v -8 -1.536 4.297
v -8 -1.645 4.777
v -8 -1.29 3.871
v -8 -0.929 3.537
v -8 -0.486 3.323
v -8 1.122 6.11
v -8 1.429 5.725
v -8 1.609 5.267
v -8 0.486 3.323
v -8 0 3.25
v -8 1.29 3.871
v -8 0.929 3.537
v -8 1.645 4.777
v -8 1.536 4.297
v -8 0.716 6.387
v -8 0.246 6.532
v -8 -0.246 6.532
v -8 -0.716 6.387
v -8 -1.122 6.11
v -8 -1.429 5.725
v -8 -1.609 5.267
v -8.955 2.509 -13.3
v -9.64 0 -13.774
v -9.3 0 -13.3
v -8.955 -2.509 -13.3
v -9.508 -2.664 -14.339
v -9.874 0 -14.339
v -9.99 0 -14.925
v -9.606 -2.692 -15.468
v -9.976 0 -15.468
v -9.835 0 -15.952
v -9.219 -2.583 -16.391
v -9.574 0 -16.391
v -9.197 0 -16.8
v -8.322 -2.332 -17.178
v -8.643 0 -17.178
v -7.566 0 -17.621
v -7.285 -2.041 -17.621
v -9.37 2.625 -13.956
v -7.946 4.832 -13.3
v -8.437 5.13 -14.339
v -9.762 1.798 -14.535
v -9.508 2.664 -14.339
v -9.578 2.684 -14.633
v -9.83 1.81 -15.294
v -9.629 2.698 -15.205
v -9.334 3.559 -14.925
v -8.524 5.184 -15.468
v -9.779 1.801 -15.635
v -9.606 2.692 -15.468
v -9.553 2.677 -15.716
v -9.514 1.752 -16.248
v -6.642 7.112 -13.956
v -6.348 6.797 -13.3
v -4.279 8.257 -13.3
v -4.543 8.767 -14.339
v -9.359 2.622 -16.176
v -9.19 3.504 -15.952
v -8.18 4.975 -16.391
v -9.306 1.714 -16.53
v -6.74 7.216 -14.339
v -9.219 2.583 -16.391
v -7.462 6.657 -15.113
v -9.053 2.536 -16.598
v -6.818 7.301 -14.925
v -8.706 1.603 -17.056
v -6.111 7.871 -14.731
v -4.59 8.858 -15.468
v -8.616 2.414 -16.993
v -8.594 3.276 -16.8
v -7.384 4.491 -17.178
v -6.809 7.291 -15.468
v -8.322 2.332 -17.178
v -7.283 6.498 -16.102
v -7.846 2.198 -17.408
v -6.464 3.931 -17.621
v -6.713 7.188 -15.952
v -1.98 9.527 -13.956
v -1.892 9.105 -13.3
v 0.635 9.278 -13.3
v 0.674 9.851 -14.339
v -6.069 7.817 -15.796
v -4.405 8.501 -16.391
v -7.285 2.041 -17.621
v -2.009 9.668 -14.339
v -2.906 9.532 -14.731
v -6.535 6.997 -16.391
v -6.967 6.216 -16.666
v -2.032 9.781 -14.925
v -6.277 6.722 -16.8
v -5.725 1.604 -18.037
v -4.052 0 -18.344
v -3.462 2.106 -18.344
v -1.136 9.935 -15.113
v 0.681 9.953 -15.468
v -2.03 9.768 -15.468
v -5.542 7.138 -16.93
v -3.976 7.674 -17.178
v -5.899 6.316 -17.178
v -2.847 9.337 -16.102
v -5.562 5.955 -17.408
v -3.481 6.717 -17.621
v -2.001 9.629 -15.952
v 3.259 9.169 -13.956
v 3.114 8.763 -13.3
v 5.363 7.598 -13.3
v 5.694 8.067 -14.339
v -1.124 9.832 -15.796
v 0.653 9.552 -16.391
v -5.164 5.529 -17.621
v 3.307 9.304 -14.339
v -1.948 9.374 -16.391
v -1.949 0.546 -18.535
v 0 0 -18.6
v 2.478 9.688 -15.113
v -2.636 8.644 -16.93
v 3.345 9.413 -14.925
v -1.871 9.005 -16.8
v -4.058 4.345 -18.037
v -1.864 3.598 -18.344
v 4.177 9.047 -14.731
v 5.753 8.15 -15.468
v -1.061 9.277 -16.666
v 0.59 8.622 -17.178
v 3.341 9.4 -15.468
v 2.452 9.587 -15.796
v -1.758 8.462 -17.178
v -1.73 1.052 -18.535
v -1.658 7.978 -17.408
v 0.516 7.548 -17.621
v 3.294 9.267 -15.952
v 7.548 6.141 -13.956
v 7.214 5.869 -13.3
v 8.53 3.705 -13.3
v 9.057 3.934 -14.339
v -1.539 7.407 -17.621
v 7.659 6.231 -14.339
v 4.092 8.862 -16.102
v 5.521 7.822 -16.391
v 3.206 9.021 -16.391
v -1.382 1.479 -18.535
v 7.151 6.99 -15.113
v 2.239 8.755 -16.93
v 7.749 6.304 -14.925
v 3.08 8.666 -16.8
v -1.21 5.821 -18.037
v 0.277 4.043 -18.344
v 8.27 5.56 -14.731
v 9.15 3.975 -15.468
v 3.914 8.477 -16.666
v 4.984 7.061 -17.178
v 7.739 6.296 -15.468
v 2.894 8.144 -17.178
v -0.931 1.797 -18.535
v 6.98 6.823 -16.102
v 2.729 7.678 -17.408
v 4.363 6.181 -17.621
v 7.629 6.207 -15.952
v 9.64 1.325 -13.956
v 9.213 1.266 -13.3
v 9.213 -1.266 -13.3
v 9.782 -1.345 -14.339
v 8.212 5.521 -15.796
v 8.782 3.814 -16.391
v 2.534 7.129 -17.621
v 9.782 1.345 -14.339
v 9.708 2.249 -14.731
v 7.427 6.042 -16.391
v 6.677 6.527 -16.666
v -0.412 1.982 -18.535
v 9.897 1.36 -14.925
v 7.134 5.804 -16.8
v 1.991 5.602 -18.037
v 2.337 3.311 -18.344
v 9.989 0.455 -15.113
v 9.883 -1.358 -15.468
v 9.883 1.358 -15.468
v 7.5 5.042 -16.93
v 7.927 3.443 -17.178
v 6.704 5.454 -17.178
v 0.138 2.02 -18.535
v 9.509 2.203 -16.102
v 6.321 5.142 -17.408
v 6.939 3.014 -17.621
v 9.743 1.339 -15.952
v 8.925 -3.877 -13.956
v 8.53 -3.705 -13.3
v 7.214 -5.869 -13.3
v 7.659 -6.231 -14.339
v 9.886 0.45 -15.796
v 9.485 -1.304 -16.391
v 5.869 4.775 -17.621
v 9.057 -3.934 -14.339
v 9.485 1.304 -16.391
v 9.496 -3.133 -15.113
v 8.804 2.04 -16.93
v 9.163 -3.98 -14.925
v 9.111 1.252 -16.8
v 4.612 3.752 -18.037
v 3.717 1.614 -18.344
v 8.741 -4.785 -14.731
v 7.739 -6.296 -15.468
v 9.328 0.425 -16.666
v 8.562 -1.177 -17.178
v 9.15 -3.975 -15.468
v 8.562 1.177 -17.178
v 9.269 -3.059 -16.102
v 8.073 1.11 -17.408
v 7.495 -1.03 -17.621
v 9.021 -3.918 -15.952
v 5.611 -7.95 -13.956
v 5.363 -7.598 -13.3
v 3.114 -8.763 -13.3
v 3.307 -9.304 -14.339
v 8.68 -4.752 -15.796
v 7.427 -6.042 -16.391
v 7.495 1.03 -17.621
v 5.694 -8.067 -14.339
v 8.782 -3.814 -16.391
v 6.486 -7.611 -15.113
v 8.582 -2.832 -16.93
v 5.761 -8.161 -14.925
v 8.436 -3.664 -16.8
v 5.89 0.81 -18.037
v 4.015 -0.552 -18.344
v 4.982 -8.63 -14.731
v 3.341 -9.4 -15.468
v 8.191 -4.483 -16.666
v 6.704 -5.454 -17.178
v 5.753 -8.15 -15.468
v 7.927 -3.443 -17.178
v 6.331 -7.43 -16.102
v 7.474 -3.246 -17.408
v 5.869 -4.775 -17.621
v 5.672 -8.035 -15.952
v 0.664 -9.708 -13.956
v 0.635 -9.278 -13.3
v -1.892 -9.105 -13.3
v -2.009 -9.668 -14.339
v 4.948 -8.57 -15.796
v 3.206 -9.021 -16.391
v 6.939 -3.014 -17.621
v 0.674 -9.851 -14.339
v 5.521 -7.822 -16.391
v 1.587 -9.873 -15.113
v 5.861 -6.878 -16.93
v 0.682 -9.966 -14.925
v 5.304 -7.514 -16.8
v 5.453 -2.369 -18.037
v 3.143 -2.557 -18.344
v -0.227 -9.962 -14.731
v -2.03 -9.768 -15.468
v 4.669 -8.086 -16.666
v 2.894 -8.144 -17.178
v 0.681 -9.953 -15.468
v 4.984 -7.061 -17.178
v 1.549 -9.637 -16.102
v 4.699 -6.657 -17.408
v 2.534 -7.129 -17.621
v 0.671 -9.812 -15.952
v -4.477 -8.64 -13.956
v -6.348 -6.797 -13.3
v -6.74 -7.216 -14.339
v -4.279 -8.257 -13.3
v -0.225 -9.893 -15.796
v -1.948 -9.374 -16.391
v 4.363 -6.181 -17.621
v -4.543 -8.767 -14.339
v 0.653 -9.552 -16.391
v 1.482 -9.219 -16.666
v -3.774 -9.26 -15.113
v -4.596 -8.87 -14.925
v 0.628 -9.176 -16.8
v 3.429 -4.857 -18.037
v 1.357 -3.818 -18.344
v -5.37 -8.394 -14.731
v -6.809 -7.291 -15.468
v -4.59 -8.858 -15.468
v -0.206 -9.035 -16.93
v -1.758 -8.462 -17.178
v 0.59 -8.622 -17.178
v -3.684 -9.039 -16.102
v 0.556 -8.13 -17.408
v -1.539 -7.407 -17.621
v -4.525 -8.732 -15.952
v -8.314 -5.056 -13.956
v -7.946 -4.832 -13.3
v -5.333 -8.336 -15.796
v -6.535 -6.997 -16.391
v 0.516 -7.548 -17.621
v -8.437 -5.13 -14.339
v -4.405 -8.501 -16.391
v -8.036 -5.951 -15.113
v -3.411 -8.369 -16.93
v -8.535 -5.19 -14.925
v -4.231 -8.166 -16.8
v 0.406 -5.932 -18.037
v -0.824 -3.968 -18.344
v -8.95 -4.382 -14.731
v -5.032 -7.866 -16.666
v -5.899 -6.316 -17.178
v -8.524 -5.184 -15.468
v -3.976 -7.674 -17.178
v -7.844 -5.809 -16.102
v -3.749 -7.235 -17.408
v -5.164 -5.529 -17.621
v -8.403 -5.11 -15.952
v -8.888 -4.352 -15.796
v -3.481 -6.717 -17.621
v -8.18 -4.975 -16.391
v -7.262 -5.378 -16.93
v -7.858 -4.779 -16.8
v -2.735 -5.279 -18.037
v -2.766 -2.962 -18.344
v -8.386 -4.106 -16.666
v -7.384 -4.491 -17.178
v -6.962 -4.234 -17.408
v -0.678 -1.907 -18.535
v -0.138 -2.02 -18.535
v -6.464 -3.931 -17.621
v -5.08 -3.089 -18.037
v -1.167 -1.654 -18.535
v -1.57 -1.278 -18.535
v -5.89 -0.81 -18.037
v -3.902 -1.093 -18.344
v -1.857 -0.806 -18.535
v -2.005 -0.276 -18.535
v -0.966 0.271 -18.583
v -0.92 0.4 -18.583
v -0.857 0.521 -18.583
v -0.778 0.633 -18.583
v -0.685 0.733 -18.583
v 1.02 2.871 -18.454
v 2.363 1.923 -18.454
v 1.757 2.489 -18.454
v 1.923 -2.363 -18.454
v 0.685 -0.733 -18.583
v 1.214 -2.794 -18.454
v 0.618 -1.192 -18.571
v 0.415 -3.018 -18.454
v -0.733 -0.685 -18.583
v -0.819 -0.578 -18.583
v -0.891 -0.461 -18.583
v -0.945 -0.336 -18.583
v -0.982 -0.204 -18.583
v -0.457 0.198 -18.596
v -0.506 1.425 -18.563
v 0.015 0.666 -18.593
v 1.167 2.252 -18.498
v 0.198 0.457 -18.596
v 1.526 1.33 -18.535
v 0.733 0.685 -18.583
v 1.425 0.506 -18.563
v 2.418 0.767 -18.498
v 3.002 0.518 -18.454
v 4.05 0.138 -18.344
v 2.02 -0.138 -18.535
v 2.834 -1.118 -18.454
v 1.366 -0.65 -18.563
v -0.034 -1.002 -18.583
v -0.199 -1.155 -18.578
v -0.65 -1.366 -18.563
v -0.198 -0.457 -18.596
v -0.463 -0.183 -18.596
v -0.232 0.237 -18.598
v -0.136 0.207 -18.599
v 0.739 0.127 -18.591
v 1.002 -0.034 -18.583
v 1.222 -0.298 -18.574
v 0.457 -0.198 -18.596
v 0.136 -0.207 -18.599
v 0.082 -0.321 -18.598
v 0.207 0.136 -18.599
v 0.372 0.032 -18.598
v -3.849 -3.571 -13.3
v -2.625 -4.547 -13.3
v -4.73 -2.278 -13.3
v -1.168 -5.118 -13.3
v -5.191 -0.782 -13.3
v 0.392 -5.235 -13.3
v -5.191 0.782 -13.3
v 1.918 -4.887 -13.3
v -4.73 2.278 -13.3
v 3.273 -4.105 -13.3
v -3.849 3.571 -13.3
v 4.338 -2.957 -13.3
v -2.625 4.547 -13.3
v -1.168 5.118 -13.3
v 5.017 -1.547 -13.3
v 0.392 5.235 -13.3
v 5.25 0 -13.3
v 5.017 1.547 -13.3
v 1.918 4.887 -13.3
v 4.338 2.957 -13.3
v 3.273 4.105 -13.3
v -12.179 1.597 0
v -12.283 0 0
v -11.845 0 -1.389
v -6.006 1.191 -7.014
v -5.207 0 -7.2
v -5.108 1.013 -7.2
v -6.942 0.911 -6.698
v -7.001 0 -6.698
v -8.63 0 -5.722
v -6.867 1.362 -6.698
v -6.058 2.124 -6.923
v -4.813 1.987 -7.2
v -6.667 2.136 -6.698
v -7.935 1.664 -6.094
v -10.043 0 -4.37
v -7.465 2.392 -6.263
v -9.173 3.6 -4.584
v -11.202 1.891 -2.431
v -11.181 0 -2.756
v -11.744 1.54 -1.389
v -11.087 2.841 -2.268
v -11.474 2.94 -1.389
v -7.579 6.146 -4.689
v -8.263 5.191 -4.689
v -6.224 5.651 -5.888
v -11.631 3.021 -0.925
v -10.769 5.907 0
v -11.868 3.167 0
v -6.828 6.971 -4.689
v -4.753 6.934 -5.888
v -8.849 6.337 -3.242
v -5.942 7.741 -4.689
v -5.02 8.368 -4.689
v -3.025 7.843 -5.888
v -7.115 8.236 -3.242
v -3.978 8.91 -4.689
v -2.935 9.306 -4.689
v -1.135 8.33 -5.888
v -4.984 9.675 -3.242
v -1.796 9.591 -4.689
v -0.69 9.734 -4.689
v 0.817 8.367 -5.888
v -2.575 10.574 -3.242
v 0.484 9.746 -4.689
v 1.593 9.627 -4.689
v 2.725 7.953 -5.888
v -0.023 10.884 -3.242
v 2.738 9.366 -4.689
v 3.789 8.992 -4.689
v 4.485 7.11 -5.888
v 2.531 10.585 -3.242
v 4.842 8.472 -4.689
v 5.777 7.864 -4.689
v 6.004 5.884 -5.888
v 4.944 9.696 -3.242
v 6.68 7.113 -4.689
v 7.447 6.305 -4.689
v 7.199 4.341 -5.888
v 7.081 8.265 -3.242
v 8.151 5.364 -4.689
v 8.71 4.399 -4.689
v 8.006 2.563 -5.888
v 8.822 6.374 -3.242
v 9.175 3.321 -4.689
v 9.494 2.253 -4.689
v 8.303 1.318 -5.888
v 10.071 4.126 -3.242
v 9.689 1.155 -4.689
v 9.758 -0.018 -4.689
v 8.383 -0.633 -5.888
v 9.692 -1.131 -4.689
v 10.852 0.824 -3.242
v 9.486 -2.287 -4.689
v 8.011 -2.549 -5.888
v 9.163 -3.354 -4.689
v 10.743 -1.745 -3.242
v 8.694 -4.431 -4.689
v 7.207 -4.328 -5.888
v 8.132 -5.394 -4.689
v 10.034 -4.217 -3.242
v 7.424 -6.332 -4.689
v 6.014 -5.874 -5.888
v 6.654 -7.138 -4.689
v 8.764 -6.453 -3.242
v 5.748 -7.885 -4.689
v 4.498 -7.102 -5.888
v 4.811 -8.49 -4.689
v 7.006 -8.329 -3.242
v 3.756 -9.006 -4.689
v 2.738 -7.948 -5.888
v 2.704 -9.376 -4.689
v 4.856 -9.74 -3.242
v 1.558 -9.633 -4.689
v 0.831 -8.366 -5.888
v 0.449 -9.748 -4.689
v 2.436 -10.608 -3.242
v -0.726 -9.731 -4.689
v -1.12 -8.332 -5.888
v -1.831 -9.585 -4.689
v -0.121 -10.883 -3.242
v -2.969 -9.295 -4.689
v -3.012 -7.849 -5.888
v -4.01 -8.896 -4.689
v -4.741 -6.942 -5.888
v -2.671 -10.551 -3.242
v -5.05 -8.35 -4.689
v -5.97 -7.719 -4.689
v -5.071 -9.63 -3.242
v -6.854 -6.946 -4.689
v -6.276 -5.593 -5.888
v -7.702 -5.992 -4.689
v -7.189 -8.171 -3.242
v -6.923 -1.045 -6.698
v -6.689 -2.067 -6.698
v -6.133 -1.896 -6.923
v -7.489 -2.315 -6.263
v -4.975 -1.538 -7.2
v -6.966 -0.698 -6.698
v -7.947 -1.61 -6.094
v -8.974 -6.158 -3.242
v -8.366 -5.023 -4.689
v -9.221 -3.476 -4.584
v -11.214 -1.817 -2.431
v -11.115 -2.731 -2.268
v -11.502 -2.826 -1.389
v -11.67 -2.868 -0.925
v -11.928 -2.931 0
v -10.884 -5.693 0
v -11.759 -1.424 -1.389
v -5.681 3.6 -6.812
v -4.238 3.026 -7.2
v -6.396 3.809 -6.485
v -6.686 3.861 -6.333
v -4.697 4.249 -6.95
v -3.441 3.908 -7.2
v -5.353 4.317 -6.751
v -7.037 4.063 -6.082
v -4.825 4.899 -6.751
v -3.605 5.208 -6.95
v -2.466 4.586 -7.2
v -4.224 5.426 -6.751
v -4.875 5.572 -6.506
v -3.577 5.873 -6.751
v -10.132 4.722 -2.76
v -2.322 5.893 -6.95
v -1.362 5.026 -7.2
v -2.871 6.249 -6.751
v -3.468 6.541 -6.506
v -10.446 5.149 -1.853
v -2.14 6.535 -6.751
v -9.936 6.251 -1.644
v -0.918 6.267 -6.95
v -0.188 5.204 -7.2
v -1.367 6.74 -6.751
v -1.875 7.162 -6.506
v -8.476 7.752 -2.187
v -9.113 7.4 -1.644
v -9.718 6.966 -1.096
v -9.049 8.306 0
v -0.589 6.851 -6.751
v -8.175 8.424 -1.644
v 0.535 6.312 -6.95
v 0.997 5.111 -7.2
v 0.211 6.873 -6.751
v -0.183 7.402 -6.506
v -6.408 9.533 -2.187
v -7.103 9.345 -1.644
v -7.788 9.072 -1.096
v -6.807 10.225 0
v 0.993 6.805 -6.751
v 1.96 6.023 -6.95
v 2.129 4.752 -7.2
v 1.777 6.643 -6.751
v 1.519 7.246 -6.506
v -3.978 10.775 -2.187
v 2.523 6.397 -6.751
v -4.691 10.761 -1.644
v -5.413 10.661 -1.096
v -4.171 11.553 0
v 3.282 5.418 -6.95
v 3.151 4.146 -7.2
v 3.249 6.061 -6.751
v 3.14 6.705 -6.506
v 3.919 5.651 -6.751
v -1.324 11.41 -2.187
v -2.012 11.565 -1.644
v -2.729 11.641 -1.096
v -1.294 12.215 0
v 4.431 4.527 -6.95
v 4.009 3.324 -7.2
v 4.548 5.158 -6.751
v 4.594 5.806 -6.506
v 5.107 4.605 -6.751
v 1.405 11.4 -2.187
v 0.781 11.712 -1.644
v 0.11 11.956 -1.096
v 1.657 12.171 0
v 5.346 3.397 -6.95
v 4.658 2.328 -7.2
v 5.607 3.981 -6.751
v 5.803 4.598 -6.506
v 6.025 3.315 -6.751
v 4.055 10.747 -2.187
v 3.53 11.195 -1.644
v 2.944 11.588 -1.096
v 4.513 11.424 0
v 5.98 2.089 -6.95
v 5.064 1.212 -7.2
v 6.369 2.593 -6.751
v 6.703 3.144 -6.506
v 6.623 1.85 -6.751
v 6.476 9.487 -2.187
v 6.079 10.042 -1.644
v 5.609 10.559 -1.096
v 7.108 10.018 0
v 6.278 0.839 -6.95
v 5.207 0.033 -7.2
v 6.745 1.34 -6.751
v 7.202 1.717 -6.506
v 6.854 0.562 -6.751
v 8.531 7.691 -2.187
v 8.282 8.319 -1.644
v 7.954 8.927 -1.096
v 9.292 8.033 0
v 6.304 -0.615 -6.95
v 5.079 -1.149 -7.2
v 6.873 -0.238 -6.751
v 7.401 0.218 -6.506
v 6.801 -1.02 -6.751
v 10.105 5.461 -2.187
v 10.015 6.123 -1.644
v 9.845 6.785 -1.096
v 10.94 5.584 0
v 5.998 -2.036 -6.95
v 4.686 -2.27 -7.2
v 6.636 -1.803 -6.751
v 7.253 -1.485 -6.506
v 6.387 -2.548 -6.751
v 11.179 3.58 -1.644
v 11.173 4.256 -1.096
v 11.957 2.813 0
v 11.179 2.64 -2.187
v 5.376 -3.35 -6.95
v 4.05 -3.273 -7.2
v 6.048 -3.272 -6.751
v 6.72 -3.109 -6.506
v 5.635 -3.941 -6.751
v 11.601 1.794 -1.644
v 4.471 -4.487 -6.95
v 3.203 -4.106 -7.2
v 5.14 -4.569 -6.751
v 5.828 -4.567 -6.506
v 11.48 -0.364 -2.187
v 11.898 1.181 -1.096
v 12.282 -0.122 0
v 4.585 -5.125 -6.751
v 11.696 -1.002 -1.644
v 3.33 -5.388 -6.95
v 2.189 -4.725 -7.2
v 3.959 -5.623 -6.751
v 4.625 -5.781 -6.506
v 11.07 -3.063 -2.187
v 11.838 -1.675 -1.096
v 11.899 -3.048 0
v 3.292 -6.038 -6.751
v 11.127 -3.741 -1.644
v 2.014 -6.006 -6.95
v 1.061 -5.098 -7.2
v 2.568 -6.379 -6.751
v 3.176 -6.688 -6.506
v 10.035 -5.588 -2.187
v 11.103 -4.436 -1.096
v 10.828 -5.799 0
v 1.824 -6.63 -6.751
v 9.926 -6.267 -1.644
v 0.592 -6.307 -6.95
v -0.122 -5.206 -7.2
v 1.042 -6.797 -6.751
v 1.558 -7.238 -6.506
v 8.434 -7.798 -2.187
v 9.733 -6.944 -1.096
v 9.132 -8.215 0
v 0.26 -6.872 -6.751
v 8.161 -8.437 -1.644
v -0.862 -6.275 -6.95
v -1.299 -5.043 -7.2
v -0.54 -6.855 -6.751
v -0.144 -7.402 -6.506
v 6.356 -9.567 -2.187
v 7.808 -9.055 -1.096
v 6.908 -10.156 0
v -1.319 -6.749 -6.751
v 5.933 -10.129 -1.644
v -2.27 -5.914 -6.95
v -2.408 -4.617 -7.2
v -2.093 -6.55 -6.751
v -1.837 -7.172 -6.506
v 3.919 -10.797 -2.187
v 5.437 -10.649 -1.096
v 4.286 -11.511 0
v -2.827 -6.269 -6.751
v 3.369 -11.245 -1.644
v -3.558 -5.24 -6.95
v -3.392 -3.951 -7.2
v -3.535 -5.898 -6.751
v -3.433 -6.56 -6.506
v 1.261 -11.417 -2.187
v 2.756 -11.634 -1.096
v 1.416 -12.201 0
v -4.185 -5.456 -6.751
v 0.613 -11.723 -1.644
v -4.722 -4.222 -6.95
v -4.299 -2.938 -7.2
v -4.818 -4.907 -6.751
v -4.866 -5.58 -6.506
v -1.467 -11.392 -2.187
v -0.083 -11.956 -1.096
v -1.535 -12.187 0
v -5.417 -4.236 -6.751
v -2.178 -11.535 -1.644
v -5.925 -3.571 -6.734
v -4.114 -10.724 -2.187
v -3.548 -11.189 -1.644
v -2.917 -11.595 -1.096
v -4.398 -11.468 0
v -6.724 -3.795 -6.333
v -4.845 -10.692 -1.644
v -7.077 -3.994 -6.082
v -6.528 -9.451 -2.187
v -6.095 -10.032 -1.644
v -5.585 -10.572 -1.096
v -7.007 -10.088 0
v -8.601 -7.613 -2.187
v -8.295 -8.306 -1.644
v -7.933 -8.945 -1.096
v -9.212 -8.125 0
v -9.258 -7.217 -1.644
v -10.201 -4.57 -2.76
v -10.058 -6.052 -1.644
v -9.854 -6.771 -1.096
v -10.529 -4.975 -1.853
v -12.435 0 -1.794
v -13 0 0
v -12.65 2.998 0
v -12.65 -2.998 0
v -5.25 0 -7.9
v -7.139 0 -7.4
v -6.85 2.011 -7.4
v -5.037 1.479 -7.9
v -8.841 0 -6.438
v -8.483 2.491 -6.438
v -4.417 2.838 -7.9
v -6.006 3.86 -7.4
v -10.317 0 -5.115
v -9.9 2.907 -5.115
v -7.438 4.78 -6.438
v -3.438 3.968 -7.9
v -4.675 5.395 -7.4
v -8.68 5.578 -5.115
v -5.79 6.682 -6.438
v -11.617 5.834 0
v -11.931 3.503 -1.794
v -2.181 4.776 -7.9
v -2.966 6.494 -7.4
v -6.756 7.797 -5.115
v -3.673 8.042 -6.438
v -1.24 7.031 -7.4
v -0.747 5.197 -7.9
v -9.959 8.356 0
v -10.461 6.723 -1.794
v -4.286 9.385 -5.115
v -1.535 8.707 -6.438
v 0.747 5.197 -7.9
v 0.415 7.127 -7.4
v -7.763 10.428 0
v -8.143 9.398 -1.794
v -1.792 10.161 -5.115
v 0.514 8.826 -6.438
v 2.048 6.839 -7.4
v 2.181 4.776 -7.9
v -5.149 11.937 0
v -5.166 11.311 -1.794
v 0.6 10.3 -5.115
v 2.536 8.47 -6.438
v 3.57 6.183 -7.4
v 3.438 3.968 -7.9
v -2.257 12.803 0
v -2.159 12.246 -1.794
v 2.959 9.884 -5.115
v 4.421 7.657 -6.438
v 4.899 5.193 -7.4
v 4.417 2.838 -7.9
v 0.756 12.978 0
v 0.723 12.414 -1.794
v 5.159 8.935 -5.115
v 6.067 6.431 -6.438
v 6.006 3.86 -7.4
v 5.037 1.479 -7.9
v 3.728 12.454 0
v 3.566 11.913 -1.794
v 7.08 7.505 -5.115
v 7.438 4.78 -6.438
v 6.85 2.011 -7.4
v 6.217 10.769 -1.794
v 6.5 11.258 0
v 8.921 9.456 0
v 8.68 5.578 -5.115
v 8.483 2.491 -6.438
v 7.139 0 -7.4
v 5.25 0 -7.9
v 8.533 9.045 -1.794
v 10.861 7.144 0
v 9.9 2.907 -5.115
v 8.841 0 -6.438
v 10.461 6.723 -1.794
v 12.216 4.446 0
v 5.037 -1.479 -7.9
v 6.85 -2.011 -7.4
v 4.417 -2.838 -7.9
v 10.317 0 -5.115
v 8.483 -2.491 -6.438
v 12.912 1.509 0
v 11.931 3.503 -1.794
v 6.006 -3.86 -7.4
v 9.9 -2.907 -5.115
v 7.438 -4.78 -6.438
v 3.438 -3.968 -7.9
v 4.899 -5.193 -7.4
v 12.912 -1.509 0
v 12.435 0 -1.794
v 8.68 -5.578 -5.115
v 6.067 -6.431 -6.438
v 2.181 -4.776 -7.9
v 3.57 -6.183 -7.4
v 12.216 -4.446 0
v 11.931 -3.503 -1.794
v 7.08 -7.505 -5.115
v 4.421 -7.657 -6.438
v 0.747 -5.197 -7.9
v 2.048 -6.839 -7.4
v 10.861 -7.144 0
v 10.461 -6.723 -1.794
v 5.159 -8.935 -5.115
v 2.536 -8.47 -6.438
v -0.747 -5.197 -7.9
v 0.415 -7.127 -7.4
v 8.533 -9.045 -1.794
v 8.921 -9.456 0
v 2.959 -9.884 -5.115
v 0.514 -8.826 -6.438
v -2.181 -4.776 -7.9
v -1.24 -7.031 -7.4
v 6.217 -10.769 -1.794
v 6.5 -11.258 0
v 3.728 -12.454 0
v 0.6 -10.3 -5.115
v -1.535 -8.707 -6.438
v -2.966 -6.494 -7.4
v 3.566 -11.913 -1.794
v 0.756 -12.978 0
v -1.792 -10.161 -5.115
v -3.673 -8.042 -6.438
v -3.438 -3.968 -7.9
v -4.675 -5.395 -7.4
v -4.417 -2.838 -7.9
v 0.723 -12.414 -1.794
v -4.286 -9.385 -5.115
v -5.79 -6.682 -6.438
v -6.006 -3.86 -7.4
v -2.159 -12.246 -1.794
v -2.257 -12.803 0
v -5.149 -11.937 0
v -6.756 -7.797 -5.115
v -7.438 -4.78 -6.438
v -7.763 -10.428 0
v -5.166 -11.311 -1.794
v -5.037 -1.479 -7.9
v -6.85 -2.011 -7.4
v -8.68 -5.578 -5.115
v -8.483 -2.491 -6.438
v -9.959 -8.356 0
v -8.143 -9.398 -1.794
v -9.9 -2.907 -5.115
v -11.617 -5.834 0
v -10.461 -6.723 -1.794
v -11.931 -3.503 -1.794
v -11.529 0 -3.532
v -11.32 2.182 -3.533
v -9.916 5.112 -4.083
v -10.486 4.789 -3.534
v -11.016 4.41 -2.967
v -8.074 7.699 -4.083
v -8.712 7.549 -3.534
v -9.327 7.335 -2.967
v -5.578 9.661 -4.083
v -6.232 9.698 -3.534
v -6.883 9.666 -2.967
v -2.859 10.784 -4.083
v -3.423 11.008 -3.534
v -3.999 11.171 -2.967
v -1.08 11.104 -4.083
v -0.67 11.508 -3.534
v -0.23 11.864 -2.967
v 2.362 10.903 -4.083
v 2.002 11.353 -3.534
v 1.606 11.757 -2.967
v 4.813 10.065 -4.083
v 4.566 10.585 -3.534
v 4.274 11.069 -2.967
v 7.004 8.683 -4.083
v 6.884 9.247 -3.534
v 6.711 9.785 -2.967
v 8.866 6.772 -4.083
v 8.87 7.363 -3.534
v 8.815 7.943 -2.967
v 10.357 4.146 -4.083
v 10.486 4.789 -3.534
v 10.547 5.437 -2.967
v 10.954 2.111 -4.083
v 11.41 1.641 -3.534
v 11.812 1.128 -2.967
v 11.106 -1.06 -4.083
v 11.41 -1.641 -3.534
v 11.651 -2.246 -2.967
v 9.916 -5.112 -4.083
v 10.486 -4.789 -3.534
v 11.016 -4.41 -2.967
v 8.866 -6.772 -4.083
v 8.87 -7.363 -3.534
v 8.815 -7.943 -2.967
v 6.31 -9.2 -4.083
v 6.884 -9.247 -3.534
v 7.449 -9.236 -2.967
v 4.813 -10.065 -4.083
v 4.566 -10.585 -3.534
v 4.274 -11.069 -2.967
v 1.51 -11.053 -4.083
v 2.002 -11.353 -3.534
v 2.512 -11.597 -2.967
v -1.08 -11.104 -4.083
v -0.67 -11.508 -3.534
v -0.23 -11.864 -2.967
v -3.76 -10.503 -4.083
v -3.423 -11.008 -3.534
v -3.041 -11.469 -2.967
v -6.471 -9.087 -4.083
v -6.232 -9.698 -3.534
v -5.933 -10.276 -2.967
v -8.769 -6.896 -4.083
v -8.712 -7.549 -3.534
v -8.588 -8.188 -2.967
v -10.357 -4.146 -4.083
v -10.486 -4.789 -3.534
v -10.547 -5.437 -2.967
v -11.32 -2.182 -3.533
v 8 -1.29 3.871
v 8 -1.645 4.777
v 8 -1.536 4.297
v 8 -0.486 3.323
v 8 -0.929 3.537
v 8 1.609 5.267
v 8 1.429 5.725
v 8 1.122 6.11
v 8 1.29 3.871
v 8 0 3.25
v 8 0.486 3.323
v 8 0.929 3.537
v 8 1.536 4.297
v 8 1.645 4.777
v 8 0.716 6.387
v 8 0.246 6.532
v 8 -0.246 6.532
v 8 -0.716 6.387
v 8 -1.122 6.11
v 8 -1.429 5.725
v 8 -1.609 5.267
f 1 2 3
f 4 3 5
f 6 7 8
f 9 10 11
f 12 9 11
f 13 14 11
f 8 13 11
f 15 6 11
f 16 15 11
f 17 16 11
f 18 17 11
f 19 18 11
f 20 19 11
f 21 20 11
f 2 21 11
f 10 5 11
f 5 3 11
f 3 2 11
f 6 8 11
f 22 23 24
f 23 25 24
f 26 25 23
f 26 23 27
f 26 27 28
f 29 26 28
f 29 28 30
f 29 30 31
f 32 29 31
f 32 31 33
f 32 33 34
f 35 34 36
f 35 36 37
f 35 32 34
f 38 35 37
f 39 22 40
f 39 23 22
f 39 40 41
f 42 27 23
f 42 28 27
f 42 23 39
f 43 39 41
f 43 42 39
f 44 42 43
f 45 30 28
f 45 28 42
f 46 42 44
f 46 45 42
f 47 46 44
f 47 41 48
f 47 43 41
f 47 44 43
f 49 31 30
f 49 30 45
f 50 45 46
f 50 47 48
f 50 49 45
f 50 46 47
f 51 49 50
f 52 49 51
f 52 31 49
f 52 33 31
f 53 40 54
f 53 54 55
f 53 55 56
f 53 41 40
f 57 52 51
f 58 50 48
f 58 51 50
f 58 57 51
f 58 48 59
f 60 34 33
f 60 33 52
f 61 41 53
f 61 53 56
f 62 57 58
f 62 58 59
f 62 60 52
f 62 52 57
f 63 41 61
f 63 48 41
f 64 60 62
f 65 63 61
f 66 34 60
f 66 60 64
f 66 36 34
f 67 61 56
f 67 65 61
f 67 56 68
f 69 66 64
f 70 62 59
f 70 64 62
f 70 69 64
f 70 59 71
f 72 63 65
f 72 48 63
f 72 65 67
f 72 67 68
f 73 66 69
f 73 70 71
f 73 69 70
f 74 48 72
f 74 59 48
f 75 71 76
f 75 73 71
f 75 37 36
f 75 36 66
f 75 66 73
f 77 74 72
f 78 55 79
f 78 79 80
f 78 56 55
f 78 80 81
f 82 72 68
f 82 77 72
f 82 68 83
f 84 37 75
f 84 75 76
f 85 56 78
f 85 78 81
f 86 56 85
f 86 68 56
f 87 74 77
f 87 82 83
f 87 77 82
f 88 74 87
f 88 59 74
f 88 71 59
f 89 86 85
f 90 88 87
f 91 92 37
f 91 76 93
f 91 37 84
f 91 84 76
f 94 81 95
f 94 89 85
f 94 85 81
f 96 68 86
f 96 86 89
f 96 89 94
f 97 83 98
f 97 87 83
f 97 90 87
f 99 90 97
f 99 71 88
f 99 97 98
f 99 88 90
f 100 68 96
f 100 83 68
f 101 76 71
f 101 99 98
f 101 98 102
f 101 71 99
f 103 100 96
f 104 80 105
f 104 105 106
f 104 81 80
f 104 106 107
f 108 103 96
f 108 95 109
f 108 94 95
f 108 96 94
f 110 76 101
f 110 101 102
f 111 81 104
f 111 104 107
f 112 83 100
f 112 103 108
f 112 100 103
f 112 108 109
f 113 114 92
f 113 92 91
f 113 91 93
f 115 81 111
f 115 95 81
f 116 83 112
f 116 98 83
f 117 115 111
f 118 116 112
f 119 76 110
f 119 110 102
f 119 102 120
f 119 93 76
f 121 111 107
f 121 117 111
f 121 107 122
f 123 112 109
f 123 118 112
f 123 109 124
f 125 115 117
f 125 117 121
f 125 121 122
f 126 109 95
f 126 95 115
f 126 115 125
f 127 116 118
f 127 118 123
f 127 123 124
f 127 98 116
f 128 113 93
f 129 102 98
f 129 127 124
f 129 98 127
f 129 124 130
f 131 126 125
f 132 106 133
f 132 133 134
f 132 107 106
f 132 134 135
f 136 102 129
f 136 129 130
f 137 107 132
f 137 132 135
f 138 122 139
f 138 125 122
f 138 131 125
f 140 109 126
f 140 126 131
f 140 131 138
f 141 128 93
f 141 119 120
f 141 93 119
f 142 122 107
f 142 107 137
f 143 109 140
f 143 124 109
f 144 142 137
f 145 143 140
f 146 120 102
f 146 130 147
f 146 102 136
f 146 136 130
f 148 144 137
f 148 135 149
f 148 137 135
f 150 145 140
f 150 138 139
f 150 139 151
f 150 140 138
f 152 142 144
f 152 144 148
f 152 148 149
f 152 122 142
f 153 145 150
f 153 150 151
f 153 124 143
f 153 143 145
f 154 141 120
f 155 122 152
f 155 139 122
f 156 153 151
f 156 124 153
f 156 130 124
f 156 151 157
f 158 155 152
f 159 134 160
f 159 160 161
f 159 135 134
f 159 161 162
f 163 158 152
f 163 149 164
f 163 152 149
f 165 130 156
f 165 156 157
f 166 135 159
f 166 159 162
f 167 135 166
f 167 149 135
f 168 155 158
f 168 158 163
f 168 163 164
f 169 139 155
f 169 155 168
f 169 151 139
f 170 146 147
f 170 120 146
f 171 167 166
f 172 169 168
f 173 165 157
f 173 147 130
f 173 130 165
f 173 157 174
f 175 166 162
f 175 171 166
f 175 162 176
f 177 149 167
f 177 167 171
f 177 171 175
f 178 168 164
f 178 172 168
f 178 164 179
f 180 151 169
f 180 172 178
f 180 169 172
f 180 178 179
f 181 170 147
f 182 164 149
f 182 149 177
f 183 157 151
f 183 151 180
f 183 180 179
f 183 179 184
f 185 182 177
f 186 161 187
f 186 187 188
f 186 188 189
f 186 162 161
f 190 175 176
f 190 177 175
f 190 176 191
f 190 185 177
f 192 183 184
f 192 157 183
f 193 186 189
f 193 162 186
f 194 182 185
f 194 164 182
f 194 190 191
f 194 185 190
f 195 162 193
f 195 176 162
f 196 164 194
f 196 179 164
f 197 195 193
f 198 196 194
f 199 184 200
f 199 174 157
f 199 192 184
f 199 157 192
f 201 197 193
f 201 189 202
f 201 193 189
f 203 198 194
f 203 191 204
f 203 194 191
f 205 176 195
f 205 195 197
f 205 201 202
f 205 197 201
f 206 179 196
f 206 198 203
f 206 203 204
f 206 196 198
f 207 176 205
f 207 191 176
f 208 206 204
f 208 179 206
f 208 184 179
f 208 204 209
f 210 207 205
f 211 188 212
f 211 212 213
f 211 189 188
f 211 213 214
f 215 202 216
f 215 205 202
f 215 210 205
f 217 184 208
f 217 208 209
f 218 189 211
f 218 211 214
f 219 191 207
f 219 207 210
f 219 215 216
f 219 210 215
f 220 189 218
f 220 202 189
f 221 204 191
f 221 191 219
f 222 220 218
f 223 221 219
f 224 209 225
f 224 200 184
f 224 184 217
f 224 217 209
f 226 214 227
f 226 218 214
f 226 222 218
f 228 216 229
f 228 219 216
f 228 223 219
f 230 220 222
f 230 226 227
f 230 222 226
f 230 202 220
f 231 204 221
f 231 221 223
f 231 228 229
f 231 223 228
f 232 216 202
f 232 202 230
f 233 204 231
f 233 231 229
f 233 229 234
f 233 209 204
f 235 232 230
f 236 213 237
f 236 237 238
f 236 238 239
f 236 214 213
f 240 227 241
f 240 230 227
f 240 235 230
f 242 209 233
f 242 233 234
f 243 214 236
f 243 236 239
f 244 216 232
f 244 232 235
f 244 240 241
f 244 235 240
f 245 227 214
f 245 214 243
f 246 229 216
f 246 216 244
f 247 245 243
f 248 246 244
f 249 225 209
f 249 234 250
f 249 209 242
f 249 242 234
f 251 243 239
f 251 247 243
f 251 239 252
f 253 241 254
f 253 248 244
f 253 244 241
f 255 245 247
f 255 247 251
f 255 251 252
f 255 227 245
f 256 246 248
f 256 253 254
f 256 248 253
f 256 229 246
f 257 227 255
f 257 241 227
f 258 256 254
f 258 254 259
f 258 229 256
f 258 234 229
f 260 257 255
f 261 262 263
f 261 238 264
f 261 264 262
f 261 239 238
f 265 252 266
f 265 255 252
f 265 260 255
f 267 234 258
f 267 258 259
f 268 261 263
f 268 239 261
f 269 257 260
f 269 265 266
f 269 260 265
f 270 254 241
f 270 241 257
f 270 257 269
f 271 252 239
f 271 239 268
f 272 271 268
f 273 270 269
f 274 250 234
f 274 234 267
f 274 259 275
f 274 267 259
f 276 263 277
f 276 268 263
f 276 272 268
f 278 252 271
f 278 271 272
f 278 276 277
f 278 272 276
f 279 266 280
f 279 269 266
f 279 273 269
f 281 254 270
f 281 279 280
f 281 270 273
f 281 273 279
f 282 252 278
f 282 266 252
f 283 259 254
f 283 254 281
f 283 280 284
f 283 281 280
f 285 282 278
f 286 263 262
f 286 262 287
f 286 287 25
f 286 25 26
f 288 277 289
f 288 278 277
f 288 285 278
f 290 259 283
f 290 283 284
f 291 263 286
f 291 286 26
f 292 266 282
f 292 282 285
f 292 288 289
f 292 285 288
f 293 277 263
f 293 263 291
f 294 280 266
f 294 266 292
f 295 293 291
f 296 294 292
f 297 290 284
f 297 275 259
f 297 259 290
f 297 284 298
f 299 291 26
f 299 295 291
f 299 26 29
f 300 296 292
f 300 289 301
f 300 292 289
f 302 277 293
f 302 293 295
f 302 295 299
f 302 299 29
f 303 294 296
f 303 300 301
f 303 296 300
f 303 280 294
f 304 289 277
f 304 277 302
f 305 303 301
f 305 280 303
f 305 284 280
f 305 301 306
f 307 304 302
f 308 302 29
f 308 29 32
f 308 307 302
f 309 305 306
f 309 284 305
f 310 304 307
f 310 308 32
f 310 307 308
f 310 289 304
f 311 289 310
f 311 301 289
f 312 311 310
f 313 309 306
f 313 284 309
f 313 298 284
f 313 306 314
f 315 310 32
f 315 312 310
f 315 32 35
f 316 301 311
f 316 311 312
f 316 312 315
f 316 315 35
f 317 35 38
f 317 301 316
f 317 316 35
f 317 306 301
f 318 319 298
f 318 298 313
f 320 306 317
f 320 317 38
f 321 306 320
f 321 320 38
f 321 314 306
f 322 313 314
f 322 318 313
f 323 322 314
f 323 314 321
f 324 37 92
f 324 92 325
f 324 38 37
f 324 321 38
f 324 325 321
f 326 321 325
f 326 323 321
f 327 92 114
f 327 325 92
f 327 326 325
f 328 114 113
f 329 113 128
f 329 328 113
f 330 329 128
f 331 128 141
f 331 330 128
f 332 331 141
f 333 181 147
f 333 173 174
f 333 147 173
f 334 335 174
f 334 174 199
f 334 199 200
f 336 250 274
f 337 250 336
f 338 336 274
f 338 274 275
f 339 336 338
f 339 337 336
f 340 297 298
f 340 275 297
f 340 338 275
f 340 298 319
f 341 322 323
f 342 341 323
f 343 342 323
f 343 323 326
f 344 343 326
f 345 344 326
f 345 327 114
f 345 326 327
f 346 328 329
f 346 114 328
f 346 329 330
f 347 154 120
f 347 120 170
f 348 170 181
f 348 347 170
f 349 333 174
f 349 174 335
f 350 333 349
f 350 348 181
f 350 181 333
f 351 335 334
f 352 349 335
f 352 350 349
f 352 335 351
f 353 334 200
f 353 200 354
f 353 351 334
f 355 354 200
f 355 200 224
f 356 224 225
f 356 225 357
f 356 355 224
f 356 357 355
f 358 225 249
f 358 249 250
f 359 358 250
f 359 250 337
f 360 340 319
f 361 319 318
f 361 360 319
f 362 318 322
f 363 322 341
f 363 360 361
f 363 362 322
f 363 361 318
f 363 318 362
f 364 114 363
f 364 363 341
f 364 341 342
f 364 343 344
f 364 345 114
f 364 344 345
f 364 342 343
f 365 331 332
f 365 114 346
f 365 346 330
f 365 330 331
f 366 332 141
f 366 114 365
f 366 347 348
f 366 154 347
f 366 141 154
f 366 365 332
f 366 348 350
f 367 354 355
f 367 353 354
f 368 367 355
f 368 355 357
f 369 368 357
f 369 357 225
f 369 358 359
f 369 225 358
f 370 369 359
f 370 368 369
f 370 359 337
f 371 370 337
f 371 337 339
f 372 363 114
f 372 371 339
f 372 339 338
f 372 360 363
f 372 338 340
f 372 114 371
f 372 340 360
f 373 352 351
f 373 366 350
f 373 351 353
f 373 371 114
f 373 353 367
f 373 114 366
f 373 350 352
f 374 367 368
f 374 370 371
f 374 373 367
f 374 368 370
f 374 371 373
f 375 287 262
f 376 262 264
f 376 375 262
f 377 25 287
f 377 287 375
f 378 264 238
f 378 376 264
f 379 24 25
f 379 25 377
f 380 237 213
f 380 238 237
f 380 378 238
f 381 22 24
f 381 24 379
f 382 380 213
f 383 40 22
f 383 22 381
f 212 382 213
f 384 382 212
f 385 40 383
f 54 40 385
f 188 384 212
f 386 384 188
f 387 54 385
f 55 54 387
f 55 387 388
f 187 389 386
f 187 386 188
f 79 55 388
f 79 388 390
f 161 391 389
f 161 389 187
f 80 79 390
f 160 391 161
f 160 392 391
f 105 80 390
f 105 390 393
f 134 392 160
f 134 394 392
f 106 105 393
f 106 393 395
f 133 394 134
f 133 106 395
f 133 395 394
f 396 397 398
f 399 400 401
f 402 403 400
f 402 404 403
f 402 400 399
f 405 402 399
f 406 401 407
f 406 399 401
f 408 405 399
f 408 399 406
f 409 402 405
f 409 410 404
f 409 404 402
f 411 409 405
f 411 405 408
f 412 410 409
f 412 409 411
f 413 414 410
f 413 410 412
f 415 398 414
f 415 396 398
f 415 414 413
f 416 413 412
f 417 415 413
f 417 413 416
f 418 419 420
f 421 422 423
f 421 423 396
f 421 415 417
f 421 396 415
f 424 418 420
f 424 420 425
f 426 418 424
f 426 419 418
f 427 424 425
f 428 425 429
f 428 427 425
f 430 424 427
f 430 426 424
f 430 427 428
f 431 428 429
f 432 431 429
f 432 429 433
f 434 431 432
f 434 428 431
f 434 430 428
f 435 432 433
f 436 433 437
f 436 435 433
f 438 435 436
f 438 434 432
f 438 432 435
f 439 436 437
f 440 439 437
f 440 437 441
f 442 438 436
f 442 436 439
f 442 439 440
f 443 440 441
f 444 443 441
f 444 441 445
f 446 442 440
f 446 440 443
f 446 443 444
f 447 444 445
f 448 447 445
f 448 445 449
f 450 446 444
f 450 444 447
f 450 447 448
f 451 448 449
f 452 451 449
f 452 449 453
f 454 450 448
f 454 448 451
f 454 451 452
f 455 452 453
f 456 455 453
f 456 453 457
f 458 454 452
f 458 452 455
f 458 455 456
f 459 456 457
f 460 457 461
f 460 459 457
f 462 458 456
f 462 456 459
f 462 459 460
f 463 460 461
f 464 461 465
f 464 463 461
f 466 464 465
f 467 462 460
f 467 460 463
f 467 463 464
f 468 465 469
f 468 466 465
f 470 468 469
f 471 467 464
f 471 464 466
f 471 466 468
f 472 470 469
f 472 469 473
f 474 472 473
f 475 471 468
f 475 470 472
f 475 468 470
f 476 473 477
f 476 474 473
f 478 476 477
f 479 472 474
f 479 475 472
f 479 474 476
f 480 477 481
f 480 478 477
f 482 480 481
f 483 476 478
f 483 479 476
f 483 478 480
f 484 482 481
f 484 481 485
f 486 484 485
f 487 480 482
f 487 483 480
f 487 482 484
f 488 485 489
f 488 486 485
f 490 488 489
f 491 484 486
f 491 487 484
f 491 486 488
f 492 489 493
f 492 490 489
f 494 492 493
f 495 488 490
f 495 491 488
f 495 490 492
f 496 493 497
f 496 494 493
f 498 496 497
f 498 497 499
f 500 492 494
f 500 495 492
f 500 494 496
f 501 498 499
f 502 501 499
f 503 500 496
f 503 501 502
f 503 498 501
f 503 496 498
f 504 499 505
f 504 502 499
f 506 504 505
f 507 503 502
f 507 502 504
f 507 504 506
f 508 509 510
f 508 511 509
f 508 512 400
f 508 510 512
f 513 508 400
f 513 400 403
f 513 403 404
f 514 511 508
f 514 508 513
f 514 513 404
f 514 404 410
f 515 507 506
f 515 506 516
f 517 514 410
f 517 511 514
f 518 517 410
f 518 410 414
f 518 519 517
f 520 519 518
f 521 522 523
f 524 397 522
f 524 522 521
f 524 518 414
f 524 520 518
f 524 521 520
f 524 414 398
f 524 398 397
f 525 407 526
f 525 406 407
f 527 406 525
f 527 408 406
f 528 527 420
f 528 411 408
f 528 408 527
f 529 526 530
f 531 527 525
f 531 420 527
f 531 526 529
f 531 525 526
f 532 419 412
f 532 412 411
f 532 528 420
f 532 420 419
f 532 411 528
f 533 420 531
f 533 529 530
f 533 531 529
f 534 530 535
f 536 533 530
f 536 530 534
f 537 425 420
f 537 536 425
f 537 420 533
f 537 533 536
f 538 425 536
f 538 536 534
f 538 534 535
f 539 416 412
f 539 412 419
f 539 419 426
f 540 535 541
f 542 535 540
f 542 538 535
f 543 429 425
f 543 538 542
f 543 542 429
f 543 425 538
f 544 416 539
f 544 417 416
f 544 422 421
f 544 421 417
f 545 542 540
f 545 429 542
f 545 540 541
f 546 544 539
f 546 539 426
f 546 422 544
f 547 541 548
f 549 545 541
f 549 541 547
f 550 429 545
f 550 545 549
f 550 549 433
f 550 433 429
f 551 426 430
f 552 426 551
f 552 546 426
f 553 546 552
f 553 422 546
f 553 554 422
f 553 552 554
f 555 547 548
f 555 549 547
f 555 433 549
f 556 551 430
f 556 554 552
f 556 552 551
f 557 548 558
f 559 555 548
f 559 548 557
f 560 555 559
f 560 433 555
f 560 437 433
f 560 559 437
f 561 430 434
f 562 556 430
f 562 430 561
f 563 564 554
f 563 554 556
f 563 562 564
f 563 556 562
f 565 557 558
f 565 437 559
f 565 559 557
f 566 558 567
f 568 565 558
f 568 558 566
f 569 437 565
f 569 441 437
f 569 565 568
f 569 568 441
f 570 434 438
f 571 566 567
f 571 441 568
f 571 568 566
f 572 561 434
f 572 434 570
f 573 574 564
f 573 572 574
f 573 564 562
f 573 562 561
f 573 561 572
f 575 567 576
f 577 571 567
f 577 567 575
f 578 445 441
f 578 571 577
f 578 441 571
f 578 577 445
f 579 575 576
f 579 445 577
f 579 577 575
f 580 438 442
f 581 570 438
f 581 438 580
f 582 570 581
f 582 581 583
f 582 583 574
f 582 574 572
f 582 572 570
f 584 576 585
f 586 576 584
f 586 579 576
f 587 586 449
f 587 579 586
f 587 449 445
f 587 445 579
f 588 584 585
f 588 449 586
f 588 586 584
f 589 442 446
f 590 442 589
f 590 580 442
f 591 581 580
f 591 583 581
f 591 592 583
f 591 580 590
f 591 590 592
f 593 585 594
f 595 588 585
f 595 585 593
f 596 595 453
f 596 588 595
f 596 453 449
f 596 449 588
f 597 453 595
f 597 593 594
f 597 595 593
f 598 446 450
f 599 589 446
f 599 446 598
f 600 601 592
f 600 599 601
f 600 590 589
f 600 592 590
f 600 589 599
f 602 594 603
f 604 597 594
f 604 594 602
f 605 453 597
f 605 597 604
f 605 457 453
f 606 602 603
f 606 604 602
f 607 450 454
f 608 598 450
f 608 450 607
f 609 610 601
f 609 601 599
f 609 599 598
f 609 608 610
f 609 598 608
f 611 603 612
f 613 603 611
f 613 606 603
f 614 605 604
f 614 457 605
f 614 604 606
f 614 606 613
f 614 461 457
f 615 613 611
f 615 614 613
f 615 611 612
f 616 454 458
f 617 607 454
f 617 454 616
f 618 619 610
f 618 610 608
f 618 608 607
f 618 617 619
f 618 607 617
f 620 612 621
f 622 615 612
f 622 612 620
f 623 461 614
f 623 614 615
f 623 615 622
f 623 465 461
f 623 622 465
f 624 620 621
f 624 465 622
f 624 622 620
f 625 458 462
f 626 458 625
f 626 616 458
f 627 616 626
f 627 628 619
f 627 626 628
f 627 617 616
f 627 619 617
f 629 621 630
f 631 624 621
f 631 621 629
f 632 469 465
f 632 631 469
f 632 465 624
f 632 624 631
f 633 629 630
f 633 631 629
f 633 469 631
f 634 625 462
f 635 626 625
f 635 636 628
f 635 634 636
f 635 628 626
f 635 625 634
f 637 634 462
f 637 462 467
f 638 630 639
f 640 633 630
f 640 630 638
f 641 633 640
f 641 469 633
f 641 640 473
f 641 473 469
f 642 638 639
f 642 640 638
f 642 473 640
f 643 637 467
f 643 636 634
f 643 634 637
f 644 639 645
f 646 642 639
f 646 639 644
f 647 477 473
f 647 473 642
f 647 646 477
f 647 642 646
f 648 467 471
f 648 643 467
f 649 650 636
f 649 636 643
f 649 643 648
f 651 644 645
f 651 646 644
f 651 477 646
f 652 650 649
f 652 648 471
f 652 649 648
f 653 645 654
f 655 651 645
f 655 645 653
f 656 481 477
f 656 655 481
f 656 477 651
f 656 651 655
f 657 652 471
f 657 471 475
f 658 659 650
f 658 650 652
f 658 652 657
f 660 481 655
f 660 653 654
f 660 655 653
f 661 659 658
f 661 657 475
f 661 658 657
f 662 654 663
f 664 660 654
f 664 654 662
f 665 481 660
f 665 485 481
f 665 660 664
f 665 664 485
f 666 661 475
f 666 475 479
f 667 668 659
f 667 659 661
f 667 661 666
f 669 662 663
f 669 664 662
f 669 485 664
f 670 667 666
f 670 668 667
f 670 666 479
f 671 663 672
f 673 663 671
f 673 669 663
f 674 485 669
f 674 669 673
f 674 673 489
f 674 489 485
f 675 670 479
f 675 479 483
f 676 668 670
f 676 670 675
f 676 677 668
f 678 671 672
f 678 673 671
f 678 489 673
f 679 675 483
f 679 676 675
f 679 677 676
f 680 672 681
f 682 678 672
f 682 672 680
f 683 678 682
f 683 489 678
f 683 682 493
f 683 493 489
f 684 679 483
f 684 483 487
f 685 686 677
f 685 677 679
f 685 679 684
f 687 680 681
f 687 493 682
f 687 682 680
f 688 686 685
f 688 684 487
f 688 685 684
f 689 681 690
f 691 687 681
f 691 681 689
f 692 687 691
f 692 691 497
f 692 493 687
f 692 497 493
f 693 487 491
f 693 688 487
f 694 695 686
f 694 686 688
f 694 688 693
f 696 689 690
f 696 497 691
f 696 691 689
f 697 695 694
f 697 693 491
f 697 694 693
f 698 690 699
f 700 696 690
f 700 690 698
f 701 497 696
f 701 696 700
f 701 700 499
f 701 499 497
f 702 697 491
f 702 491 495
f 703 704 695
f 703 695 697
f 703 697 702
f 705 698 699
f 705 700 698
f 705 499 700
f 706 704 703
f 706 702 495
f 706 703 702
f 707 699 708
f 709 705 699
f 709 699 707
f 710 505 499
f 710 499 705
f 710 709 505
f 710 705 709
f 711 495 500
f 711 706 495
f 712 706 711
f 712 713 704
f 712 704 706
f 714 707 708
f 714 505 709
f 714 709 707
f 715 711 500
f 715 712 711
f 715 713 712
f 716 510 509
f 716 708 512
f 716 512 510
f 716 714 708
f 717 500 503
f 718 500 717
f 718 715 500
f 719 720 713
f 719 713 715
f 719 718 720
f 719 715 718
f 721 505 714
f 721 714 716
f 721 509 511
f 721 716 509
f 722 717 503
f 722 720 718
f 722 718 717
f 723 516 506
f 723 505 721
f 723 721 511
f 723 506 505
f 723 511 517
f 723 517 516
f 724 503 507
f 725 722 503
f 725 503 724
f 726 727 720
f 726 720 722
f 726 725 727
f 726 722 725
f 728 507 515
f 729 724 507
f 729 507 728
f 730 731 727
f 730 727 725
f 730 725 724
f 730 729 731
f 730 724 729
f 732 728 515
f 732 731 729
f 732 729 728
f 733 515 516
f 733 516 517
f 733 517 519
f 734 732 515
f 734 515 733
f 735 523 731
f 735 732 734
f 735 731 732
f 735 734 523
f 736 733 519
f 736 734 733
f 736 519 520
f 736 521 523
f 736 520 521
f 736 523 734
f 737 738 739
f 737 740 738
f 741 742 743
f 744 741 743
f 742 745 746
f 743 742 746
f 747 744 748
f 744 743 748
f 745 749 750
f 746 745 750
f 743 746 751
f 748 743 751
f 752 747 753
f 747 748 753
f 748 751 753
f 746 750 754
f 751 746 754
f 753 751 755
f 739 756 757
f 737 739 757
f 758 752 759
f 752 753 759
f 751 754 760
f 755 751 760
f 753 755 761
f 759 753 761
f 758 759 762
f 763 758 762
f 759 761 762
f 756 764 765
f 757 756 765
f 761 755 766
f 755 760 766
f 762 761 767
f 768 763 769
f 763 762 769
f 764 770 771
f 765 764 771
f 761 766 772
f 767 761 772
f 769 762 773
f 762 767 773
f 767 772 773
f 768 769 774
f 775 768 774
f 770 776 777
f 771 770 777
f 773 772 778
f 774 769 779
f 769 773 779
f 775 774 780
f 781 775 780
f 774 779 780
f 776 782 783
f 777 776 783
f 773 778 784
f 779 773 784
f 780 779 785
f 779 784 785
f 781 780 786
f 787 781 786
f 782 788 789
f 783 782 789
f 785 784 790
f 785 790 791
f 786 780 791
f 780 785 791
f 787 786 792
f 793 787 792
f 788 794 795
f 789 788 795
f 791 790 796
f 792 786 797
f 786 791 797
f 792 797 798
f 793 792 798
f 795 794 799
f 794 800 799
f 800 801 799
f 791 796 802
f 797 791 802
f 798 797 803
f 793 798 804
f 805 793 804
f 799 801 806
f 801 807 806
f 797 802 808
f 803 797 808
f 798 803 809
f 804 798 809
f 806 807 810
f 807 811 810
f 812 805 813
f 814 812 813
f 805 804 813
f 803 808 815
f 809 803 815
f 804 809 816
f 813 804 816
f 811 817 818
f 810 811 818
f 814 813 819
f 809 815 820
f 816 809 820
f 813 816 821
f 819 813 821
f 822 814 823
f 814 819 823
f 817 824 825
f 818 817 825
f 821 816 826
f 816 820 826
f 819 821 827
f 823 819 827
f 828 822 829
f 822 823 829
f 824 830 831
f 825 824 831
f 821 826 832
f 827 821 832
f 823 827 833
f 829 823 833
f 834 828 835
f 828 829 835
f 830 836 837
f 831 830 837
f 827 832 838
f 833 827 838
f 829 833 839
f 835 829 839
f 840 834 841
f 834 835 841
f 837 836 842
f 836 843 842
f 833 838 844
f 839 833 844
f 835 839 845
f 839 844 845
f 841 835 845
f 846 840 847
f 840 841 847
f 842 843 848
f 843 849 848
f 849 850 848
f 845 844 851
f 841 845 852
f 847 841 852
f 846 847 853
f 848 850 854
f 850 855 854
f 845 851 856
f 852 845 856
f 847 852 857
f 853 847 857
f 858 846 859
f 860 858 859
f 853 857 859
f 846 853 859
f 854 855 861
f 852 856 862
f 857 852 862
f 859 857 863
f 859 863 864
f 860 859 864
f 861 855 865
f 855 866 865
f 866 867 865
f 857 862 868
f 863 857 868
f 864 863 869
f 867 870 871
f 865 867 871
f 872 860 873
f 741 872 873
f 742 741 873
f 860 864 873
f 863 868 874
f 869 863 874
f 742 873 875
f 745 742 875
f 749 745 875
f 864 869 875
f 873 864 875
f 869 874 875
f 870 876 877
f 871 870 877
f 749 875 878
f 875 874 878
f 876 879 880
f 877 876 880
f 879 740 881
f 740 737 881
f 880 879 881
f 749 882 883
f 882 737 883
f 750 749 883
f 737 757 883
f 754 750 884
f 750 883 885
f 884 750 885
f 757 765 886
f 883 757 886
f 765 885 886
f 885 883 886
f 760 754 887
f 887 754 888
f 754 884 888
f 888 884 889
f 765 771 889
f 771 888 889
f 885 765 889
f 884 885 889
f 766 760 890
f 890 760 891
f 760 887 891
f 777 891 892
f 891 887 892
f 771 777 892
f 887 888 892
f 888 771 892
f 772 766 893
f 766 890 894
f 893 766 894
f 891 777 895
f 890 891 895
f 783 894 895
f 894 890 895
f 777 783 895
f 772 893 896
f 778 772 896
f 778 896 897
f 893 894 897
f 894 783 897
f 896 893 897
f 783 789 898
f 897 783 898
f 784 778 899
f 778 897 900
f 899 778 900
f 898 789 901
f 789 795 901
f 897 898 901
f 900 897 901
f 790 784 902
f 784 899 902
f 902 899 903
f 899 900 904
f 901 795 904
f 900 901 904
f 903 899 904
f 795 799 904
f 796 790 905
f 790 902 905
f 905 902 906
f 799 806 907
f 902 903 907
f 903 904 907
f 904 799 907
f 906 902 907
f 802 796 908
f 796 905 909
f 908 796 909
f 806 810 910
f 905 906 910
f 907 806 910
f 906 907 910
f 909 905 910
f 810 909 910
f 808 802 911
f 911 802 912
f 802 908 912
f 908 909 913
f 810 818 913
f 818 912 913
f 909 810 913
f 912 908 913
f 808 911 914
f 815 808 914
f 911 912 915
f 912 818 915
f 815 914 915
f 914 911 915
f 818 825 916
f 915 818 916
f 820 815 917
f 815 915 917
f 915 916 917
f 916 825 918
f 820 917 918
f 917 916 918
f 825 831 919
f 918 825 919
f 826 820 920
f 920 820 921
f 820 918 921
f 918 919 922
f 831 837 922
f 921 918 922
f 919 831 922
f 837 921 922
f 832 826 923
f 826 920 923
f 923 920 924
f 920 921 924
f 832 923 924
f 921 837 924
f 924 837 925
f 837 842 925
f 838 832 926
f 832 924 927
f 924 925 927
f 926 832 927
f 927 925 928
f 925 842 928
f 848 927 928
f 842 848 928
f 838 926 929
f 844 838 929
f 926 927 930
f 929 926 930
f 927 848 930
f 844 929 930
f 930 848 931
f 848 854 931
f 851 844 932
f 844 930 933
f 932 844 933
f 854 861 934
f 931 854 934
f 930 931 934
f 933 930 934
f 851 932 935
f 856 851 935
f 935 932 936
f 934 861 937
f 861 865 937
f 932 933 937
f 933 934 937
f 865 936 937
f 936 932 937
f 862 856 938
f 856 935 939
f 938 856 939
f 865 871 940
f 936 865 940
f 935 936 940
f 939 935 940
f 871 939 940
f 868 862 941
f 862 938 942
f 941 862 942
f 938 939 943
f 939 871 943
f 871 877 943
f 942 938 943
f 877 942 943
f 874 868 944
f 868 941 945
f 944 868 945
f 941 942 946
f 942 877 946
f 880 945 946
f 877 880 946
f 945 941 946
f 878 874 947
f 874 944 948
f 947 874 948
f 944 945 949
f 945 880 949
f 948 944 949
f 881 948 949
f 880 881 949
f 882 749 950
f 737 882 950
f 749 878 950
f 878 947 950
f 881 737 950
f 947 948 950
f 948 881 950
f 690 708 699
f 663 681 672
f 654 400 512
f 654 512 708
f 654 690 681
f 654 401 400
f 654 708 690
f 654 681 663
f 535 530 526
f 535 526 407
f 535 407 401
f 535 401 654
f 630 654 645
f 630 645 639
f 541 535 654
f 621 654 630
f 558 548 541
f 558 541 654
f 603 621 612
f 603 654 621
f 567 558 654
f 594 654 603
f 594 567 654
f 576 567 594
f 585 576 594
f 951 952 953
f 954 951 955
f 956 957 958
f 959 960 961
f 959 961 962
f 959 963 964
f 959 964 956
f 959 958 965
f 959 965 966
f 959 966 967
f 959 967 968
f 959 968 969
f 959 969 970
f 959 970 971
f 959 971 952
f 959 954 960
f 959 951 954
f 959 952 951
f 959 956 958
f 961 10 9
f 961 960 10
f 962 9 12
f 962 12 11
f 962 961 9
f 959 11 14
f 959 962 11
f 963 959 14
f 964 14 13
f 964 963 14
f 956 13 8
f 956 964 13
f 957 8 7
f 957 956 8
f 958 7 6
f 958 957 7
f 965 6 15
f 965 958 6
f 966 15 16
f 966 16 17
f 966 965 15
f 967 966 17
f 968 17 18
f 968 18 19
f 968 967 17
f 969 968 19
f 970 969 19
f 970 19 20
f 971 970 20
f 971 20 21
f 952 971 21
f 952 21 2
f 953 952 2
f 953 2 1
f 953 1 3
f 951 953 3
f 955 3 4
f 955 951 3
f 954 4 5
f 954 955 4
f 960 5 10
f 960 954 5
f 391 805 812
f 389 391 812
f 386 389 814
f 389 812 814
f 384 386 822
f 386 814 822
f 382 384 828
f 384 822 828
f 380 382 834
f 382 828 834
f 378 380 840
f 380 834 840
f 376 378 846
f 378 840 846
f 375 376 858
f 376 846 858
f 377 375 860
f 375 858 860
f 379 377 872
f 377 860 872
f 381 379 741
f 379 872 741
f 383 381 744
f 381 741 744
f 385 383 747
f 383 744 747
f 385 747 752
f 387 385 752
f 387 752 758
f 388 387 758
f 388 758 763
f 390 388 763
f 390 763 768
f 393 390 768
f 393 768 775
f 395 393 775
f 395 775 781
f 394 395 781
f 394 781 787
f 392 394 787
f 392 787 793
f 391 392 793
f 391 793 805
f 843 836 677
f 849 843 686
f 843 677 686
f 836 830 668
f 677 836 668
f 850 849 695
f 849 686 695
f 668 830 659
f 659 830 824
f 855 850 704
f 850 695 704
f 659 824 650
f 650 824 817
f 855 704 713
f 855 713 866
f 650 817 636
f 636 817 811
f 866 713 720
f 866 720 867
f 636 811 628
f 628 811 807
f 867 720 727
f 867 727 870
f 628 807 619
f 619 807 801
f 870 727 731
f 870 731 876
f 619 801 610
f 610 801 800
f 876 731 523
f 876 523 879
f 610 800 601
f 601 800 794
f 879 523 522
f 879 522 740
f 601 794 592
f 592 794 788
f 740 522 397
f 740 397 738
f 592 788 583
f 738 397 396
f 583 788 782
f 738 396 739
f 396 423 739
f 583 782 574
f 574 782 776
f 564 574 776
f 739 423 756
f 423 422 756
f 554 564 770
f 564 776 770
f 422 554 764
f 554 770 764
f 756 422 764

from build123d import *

# Parameters (mm, degrees)
SHELL1_T            = -0.7
SKETCH2_R           = 5.25
BOSS_EXTRUDE1_DEPTH = 5.4
SKETCH4_R           = 1.65
BOSS_EXTRUDE2_DEPTH = 8


with BuildPart() as part:
    # Sketch1 → Revolve1 (revolve)
    with BuildSketch(Plane(origin=(0, 0, 0), x_dir=(1, 0, 0), z_dir=(0, 1, 0))):
        with BuildLine():
            Line((-13, 0), (0, 0))
            Line((0, 0), (0, 7.9))
            Line((0, 7.9), (-5.25, 7.9))
            add(Edge.make_bspline(
                [(-5.25, 7.9), (-9.186458611, 7.430852086), (-12.235748674, 3.583812434), (-13, 0)],
                knots=[0, 0, 0, 0, 1, 1, 1, 1], degree=3))
        make_face()
    revolve(axis=Axis((0, 0, 0), (0, 0, -1)))

    # Shell1
    shell1_openings = [part.faces().sort_by_distance(p)[0] for p in [
        (0, 0, 0),
    ]]
    offset(amount=SHELL1_T, openings=shell1_openings, kind=Kind.INTERSECTION)

    # Sketch2 → Boss-Extrude1 (add)
    with BuildSketch(Plane(origin=(0, 0, -7.9), x_dir=(-1, 0, 0), z_dir=(0, 0, -1))):
        with Locations(Location((0, 0, 0), (0, 0, 180))):
            Circle(SKETCH2_R)
    extrude(amount=BOSS_EXTRUDE1_DEPTH)

    # Sketch3 → Revolve2 (revolve)
    with BuildSketch(Plane(origin=(0, 0, 0), x_dir=(1, 0, 0), z_dir=(0, 1, 0))):
        with BuildLine():
            Line((0, 13.3), (-9.3, 13.3))
            add(Edge.make_bspline(
                [(-9.3, 13.3), (-9.736235745, 13.755003631), (-10.224214241, 15.180437203), (-9.731031698, 16.308849724), (-8.021916977, 17.920792712), (-3.389077274, 18.6), (0, 18.6)],
                knots=[0, 0, 0, 0, 0.216854983, 0.411075257, 0.489389758, 1, 1, 1, 1], degree=3))
            Line((0, 18.6), (0, 13.3))
        make_face()
    revolve(axis=Axis((0, 0, 0), (0, 0, -1)))


with BuildPart() as body_2:
    # Sketch4 → Boss-Extrude2 (new, symmetric)
    with BuildSketch(Plane(origin=(0, 0, 0), x_dir=(0, 0, -1), z_dir=(1, 0, 0))):
        with Locations((-4.9, 0)):
            Circle(SKETCH4_R)
    extrude(amount=BOSS_EXTRUDE2_DEPTH, both=True)


solid = Compound([part.part, body_2.part])
